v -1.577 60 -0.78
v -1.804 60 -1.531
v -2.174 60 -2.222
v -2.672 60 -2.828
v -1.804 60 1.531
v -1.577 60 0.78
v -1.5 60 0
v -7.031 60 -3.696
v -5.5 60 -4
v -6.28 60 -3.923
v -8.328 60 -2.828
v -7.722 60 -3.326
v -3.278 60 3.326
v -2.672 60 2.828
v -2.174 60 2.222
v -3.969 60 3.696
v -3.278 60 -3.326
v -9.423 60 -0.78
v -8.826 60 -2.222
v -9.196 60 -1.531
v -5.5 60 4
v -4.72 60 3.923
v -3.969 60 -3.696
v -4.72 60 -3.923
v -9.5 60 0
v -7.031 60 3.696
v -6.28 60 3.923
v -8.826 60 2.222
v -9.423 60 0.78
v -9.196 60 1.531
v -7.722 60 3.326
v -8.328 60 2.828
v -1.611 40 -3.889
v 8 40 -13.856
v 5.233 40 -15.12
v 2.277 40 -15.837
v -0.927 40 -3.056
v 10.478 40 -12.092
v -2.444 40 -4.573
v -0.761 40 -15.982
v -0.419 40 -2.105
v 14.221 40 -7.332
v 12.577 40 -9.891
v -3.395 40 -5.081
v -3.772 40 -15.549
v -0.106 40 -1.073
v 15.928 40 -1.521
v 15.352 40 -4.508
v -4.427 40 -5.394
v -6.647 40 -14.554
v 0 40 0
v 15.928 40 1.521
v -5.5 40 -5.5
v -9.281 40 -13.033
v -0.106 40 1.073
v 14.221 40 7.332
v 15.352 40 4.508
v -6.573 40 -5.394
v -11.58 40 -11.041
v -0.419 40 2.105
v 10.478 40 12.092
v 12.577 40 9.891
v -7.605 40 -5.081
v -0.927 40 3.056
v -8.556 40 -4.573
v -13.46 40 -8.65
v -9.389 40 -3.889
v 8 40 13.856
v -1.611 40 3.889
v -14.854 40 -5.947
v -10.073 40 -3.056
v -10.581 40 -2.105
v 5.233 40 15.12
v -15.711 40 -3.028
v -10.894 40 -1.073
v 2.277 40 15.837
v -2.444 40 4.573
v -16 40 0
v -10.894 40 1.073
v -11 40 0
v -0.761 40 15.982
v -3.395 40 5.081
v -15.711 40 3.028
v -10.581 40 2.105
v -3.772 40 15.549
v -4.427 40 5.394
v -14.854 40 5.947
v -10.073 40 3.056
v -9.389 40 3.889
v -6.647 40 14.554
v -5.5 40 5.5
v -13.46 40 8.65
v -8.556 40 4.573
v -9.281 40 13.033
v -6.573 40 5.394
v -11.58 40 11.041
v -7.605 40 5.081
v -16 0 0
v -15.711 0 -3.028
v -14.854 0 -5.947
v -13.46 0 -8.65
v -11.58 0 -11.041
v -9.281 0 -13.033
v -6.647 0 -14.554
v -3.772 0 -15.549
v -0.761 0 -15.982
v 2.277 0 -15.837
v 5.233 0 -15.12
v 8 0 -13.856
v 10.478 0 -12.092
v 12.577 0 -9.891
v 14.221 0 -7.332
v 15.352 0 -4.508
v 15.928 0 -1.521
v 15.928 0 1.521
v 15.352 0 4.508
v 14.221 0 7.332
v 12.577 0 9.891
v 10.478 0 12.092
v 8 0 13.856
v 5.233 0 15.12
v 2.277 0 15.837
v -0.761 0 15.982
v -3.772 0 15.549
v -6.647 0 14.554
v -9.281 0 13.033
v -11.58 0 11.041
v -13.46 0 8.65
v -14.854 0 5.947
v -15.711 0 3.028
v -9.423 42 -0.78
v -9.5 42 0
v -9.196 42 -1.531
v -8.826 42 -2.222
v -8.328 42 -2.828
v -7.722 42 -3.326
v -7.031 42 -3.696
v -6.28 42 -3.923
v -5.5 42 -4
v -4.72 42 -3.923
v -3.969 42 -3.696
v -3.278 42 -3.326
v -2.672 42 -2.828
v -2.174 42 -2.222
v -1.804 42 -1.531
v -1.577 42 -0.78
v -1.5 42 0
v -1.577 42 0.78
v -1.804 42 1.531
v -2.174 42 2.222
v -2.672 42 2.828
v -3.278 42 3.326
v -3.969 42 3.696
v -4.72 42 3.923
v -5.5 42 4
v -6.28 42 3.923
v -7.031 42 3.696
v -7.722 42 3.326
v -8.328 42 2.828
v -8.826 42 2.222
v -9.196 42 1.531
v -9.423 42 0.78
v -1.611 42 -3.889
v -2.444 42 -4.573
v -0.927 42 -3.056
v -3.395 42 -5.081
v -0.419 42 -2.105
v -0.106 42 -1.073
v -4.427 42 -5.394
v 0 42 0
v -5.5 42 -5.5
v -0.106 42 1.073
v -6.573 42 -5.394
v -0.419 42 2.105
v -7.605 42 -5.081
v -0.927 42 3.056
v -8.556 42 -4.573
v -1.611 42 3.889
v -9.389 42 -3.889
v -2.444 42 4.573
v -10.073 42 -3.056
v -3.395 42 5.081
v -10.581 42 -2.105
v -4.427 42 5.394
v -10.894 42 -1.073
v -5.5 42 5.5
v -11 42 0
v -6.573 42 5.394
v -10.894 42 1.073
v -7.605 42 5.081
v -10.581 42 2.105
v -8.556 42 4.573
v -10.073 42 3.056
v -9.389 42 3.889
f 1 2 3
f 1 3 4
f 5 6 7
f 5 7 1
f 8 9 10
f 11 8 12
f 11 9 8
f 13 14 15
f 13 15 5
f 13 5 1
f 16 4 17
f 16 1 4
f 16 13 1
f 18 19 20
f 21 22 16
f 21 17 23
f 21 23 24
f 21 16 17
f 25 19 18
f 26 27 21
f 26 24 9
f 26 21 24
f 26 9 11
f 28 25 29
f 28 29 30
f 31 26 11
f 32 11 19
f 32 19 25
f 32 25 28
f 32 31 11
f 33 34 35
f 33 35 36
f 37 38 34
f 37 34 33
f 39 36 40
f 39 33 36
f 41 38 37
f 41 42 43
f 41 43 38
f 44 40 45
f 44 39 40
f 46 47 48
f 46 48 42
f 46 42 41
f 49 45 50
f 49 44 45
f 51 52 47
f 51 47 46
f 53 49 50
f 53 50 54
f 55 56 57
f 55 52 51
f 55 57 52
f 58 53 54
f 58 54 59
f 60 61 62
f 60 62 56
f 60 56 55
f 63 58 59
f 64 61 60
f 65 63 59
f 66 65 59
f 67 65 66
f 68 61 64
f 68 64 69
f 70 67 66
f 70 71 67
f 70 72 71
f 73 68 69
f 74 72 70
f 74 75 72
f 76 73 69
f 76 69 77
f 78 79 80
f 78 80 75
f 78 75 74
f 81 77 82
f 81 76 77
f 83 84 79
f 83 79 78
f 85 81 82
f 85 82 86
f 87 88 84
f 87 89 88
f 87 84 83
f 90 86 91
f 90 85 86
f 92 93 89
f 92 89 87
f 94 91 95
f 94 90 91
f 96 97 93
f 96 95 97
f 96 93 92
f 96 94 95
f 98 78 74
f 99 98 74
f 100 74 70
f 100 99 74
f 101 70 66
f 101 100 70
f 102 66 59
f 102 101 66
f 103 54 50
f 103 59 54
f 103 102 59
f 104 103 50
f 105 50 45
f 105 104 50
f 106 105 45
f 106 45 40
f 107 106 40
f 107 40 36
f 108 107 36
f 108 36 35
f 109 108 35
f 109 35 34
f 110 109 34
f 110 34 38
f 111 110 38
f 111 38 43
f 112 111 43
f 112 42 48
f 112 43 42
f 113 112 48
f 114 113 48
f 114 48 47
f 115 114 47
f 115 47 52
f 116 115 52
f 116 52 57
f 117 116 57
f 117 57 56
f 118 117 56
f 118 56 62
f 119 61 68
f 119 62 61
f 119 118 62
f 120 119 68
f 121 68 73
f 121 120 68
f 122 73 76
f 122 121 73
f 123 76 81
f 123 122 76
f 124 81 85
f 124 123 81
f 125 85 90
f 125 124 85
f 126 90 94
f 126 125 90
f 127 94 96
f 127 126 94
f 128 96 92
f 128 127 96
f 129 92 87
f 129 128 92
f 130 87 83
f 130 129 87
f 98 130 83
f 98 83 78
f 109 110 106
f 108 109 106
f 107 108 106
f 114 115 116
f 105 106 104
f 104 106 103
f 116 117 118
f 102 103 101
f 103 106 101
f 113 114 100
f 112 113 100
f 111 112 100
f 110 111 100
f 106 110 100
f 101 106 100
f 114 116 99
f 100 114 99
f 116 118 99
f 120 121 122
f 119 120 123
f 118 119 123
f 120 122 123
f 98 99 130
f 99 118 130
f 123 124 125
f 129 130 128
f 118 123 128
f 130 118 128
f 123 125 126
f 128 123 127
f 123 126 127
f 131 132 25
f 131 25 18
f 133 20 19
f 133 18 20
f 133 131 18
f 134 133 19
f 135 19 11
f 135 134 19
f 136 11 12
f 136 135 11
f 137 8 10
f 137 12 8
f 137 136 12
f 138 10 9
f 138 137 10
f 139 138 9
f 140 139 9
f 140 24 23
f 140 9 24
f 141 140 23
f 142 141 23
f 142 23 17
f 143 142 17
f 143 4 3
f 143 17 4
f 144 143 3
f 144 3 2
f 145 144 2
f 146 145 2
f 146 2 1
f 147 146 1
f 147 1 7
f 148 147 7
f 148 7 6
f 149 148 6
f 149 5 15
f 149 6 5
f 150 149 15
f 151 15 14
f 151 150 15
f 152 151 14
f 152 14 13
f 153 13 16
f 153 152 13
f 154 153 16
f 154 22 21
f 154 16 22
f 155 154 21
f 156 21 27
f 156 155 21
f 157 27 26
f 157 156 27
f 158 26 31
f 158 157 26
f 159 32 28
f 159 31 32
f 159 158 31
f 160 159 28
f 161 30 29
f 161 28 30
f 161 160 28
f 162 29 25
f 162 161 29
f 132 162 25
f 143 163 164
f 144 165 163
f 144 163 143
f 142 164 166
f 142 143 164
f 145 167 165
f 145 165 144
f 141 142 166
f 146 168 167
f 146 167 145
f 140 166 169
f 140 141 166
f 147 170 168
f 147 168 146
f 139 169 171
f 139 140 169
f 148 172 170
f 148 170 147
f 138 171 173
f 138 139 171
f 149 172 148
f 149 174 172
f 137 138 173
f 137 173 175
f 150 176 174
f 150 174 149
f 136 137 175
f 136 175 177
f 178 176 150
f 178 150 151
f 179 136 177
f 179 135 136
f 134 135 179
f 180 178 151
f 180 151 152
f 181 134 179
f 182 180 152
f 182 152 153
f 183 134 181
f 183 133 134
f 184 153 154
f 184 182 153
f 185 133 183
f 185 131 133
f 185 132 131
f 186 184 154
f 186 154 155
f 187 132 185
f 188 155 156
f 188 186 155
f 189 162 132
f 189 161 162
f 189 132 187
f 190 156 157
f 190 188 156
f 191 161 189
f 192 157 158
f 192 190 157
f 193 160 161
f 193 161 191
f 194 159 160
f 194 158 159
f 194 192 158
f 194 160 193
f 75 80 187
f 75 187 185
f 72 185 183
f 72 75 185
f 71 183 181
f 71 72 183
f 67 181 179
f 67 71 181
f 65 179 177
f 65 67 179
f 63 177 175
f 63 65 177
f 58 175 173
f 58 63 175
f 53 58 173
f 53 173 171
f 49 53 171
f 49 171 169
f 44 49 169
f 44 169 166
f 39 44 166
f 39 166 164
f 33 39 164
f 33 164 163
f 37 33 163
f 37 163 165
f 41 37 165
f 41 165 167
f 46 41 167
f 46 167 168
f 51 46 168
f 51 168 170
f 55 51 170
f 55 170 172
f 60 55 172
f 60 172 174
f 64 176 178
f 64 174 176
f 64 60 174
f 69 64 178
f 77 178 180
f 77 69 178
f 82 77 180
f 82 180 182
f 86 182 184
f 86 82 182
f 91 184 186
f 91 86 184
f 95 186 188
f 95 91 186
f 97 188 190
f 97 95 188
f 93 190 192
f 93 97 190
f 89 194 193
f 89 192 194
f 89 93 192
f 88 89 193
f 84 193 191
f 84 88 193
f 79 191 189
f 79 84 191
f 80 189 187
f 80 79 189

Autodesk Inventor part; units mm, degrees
ref_plane "YZ Plane" through (0, 0, 0) normal (1, 0, 0) x (0, 1, 0)
ref_plane "XZ Plane" through (0, 0, 0) normal (0, 1, 0) x (-1, 0, 0)
ref_plane "XY Plane" through (0, 0, 0) normal (0, 0, 1) x (1, 0, 0)
sketch "Szkic1" plane through (0, 0, 0) normal (0, 1, 0) x (-1, 0, 0)
  circle A0 centre (0, 0) radius 16
  circle A1 centre (5.5, 0) radius 5.5
  circle A2 centre (5.5, 0) radius 4
  dimension "d1" = 11
  dimension "d0" = 32
  dimension "d2" = 8
extrude "Wyciągnięcie proste1" add sketch "Szkic1" along normal blind 40 contours A0
extrude "Wyciągnięcie proste2" add sketch "Szkic1" along normal blind 42 contours A1
extrude "Wyciągnięcie proste3" add sketch "Szkic1" along normal blind 60 contours A2
properties part number "silnik"
